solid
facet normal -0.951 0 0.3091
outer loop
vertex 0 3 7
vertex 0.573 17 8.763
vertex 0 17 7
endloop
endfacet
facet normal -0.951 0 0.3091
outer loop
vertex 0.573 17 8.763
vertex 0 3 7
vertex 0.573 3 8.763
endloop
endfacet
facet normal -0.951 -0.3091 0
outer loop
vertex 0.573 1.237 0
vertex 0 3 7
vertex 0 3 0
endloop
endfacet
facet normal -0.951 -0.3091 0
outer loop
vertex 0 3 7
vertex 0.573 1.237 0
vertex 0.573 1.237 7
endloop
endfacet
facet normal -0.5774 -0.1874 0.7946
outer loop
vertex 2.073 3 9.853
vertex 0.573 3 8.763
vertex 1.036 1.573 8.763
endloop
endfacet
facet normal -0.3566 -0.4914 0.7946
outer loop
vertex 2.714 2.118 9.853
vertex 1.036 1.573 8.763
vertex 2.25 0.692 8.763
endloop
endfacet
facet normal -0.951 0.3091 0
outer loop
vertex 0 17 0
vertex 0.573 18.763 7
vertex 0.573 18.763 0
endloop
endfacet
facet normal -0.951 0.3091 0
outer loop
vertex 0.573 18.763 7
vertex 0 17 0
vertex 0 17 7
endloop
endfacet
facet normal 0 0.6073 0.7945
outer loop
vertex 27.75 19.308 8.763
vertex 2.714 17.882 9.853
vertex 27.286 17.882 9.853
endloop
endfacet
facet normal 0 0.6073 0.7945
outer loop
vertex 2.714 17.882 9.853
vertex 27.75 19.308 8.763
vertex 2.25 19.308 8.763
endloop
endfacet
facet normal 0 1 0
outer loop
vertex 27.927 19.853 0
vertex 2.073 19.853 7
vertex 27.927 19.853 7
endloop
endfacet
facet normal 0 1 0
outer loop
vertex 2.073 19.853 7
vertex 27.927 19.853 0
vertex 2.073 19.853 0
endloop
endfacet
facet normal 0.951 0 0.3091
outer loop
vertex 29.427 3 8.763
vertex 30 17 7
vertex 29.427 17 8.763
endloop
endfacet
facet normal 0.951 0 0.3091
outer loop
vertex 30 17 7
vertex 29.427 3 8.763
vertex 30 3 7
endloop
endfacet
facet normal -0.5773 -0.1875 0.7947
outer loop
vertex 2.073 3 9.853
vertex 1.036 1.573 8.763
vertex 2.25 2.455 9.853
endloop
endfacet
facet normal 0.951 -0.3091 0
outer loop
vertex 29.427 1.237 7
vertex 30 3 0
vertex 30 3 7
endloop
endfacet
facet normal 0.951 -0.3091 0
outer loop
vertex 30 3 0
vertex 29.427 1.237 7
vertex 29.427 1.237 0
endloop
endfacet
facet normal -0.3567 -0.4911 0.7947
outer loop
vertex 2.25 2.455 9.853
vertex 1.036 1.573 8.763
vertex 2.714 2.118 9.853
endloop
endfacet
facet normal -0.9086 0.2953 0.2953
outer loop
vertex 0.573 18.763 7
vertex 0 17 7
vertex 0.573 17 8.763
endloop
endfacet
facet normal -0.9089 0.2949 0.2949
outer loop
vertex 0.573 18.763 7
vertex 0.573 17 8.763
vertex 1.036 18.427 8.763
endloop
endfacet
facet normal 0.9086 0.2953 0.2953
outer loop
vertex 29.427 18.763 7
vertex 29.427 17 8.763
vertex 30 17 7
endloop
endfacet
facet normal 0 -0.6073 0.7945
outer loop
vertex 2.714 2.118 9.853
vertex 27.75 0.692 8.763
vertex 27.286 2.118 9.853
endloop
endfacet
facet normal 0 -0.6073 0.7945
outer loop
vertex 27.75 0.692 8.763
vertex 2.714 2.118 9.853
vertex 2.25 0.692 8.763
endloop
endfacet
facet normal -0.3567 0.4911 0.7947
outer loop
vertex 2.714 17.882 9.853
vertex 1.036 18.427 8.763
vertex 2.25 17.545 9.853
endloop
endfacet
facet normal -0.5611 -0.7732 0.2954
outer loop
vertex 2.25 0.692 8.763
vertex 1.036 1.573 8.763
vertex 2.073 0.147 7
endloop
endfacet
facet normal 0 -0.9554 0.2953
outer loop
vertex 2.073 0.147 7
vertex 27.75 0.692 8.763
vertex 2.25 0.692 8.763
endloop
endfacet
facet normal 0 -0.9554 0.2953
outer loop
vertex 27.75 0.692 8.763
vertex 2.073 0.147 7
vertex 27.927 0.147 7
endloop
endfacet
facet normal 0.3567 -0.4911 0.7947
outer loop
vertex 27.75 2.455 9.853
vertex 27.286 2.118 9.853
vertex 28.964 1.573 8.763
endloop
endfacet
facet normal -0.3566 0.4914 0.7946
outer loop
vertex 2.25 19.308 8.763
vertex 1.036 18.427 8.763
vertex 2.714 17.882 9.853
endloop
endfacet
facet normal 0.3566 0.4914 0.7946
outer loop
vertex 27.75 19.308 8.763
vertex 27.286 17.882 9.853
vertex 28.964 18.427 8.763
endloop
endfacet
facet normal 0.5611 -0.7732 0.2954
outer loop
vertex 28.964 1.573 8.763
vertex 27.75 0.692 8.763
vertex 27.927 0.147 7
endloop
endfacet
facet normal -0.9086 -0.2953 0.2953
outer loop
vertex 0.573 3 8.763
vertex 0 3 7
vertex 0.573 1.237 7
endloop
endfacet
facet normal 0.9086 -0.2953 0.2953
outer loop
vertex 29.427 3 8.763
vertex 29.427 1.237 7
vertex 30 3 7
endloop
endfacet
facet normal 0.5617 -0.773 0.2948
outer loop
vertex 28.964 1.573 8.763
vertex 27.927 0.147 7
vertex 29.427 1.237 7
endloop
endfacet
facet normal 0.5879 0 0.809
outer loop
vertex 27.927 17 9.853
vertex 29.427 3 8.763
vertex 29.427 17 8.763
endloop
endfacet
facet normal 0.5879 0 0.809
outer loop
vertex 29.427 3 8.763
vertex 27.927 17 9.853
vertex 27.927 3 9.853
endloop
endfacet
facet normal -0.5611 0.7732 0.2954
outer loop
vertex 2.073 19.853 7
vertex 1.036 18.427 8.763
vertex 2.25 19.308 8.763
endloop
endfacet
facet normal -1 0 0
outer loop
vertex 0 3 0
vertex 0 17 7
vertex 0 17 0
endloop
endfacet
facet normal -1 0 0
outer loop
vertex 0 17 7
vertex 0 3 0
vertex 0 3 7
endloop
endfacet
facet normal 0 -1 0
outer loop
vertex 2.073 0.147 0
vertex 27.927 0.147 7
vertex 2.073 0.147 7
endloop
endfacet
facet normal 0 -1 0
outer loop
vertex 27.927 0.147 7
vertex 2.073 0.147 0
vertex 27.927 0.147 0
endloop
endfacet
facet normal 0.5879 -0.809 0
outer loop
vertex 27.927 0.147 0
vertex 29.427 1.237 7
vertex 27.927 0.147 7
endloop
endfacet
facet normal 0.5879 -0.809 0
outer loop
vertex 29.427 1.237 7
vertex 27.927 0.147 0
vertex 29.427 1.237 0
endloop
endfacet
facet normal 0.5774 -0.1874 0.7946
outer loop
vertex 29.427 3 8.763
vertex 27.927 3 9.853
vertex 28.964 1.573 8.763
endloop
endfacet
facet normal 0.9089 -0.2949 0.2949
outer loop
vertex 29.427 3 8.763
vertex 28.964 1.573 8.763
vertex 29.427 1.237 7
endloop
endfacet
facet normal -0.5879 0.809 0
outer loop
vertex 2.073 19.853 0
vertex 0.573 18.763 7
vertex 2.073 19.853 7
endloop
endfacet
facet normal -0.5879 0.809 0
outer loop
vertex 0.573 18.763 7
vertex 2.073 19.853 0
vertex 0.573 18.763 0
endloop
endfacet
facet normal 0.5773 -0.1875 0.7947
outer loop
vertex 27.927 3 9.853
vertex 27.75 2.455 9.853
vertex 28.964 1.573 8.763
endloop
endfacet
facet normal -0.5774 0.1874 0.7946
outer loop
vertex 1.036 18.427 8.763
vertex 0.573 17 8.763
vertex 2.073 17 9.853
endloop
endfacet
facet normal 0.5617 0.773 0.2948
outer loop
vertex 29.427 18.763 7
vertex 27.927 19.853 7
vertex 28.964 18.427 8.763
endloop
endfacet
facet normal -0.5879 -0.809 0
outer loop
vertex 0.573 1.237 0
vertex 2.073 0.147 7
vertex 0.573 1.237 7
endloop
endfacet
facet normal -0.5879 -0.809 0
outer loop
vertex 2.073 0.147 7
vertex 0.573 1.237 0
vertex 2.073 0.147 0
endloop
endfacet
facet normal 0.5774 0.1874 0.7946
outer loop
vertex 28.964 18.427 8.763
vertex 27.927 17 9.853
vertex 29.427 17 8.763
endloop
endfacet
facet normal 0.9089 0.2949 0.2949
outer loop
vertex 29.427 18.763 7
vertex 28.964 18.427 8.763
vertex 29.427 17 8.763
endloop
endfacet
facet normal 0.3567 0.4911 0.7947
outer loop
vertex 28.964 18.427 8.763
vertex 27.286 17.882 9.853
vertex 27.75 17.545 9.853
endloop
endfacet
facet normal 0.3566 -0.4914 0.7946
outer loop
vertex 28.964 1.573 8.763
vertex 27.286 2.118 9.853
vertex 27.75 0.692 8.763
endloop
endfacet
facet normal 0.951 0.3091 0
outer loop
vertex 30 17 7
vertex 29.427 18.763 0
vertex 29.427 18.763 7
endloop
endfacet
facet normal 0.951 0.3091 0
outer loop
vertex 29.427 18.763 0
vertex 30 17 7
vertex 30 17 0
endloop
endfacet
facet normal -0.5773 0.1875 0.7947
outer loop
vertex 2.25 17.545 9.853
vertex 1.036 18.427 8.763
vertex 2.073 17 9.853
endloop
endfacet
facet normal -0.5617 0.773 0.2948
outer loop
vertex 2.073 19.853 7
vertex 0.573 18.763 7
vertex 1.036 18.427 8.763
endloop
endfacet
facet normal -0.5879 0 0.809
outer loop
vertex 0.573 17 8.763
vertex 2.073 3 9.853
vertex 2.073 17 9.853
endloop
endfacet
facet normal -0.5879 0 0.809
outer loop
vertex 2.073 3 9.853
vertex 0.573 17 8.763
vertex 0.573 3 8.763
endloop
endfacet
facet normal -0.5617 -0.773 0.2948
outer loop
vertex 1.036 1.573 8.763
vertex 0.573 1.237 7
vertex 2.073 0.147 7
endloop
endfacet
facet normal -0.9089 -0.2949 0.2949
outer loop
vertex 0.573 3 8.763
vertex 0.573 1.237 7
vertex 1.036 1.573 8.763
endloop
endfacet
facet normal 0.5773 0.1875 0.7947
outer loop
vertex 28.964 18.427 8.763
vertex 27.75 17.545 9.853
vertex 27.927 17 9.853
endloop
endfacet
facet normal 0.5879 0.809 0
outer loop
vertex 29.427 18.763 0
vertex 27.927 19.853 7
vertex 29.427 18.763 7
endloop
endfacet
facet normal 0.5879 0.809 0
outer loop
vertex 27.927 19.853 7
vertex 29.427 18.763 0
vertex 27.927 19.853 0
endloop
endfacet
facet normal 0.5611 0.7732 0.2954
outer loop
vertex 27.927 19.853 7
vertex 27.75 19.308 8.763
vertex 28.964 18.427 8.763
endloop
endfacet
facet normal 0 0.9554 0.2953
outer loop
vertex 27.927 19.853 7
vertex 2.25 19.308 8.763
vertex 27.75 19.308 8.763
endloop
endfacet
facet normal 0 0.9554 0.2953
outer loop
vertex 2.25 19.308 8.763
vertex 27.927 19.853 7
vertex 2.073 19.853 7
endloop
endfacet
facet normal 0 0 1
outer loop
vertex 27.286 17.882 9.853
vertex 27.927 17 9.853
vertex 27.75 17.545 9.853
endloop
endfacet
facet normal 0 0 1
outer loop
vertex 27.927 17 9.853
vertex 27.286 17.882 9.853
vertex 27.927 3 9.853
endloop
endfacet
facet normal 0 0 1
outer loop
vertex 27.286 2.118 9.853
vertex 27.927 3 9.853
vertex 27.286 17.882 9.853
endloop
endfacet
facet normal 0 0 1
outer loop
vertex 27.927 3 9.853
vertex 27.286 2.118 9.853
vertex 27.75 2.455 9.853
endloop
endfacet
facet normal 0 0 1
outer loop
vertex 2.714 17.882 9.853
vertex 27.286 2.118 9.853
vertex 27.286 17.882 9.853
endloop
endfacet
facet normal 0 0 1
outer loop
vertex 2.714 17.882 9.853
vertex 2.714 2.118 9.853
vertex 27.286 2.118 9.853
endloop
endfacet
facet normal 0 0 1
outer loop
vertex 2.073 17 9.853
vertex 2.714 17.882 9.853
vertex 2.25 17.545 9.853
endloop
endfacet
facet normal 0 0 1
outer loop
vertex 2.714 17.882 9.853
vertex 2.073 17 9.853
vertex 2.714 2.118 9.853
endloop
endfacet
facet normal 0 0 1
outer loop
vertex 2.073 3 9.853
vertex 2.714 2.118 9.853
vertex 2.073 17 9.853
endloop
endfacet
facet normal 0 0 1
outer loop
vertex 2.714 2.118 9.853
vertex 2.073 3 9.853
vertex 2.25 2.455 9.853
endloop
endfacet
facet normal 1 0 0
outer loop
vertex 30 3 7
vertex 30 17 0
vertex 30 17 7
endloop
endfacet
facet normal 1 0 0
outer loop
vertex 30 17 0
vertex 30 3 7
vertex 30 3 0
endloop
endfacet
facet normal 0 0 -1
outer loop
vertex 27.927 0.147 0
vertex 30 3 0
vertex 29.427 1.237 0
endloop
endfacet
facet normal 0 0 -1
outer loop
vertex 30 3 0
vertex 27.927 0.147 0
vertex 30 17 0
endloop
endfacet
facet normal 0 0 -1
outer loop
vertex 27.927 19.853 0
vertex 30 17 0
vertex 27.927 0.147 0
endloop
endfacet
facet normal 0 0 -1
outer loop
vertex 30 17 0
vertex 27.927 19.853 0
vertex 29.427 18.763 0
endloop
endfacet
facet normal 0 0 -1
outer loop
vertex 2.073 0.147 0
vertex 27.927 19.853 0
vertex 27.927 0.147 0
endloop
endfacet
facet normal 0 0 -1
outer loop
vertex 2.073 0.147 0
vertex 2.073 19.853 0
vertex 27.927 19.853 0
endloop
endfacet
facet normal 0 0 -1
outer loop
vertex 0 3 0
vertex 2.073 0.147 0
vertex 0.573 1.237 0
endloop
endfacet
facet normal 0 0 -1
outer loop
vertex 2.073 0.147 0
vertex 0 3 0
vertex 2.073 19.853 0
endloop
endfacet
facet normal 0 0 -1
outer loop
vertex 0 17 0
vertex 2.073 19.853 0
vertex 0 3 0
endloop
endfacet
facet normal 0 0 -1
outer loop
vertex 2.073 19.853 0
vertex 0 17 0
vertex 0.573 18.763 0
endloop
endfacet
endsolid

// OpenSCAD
// Example:
roundedCube(
  x = 30,
  y = 20,
  z = 10,
  r = 3,
  flatBottom = true
);

module roundedCube(
  x,
  y,
  z,
  r,
  flatTop = false,
  flatBottom = false,
  flatLeft = false,
  flatRight = false,
  flatFront = false,
  flatBack = false
) {
  difference() {
    // Main rounded cube:
    translate([
      flatLeft ? 0 : r,
      flatFront ? 0 : r,
      flatBottom ? 0 : r
    ]) {
      minkowski() {
        cube([
          x - r * (flatLeft && flatRight ? 0 : (flatLeft || flatRight ? 1 : 2)),
          y - r * (flatFront && flatBack ? 0 : (flatFront || flatBack ? 1 : 2)),
          z - r * (flatTop && flatBottom ? 0 : (flatTop || flatBottom ? 1 : 2))
        ]);
        sphere(r = r);
      }
    }
    // Optional cutouts:
    // (let's not generate unnecessary geometry)
    if (flatTop) {
      translate([ x / -2, y / -2, z ])
      cube([ x * 2, y * 2, z ]);
    }
    if (flatBottom) {
      translate([ x / -2, y / -2, -z ])
      cube([ x * 2, y * 2, z ]);
    }
    if (flatLeft) {
      translate([ -x, y / -2, z / -2 ])
      cube([ x, y * 2, z * 2 ]);
    }
    if (flatRight) {
      translate([ x, y / -2, z / -2 ])
      cube([ x, y * 2, z * 2 ]);
    }
    if (flatFront) {
      translate([ x / -2, -y, z / -2 ])
      cube([ x * 2, y, z * 2 ]);
    }
    if (flatBack) {
      translate([ x / -2, y, z / -2 ])
      cube([ x * 2, y, z * 2 ]);
    }
  }
}
